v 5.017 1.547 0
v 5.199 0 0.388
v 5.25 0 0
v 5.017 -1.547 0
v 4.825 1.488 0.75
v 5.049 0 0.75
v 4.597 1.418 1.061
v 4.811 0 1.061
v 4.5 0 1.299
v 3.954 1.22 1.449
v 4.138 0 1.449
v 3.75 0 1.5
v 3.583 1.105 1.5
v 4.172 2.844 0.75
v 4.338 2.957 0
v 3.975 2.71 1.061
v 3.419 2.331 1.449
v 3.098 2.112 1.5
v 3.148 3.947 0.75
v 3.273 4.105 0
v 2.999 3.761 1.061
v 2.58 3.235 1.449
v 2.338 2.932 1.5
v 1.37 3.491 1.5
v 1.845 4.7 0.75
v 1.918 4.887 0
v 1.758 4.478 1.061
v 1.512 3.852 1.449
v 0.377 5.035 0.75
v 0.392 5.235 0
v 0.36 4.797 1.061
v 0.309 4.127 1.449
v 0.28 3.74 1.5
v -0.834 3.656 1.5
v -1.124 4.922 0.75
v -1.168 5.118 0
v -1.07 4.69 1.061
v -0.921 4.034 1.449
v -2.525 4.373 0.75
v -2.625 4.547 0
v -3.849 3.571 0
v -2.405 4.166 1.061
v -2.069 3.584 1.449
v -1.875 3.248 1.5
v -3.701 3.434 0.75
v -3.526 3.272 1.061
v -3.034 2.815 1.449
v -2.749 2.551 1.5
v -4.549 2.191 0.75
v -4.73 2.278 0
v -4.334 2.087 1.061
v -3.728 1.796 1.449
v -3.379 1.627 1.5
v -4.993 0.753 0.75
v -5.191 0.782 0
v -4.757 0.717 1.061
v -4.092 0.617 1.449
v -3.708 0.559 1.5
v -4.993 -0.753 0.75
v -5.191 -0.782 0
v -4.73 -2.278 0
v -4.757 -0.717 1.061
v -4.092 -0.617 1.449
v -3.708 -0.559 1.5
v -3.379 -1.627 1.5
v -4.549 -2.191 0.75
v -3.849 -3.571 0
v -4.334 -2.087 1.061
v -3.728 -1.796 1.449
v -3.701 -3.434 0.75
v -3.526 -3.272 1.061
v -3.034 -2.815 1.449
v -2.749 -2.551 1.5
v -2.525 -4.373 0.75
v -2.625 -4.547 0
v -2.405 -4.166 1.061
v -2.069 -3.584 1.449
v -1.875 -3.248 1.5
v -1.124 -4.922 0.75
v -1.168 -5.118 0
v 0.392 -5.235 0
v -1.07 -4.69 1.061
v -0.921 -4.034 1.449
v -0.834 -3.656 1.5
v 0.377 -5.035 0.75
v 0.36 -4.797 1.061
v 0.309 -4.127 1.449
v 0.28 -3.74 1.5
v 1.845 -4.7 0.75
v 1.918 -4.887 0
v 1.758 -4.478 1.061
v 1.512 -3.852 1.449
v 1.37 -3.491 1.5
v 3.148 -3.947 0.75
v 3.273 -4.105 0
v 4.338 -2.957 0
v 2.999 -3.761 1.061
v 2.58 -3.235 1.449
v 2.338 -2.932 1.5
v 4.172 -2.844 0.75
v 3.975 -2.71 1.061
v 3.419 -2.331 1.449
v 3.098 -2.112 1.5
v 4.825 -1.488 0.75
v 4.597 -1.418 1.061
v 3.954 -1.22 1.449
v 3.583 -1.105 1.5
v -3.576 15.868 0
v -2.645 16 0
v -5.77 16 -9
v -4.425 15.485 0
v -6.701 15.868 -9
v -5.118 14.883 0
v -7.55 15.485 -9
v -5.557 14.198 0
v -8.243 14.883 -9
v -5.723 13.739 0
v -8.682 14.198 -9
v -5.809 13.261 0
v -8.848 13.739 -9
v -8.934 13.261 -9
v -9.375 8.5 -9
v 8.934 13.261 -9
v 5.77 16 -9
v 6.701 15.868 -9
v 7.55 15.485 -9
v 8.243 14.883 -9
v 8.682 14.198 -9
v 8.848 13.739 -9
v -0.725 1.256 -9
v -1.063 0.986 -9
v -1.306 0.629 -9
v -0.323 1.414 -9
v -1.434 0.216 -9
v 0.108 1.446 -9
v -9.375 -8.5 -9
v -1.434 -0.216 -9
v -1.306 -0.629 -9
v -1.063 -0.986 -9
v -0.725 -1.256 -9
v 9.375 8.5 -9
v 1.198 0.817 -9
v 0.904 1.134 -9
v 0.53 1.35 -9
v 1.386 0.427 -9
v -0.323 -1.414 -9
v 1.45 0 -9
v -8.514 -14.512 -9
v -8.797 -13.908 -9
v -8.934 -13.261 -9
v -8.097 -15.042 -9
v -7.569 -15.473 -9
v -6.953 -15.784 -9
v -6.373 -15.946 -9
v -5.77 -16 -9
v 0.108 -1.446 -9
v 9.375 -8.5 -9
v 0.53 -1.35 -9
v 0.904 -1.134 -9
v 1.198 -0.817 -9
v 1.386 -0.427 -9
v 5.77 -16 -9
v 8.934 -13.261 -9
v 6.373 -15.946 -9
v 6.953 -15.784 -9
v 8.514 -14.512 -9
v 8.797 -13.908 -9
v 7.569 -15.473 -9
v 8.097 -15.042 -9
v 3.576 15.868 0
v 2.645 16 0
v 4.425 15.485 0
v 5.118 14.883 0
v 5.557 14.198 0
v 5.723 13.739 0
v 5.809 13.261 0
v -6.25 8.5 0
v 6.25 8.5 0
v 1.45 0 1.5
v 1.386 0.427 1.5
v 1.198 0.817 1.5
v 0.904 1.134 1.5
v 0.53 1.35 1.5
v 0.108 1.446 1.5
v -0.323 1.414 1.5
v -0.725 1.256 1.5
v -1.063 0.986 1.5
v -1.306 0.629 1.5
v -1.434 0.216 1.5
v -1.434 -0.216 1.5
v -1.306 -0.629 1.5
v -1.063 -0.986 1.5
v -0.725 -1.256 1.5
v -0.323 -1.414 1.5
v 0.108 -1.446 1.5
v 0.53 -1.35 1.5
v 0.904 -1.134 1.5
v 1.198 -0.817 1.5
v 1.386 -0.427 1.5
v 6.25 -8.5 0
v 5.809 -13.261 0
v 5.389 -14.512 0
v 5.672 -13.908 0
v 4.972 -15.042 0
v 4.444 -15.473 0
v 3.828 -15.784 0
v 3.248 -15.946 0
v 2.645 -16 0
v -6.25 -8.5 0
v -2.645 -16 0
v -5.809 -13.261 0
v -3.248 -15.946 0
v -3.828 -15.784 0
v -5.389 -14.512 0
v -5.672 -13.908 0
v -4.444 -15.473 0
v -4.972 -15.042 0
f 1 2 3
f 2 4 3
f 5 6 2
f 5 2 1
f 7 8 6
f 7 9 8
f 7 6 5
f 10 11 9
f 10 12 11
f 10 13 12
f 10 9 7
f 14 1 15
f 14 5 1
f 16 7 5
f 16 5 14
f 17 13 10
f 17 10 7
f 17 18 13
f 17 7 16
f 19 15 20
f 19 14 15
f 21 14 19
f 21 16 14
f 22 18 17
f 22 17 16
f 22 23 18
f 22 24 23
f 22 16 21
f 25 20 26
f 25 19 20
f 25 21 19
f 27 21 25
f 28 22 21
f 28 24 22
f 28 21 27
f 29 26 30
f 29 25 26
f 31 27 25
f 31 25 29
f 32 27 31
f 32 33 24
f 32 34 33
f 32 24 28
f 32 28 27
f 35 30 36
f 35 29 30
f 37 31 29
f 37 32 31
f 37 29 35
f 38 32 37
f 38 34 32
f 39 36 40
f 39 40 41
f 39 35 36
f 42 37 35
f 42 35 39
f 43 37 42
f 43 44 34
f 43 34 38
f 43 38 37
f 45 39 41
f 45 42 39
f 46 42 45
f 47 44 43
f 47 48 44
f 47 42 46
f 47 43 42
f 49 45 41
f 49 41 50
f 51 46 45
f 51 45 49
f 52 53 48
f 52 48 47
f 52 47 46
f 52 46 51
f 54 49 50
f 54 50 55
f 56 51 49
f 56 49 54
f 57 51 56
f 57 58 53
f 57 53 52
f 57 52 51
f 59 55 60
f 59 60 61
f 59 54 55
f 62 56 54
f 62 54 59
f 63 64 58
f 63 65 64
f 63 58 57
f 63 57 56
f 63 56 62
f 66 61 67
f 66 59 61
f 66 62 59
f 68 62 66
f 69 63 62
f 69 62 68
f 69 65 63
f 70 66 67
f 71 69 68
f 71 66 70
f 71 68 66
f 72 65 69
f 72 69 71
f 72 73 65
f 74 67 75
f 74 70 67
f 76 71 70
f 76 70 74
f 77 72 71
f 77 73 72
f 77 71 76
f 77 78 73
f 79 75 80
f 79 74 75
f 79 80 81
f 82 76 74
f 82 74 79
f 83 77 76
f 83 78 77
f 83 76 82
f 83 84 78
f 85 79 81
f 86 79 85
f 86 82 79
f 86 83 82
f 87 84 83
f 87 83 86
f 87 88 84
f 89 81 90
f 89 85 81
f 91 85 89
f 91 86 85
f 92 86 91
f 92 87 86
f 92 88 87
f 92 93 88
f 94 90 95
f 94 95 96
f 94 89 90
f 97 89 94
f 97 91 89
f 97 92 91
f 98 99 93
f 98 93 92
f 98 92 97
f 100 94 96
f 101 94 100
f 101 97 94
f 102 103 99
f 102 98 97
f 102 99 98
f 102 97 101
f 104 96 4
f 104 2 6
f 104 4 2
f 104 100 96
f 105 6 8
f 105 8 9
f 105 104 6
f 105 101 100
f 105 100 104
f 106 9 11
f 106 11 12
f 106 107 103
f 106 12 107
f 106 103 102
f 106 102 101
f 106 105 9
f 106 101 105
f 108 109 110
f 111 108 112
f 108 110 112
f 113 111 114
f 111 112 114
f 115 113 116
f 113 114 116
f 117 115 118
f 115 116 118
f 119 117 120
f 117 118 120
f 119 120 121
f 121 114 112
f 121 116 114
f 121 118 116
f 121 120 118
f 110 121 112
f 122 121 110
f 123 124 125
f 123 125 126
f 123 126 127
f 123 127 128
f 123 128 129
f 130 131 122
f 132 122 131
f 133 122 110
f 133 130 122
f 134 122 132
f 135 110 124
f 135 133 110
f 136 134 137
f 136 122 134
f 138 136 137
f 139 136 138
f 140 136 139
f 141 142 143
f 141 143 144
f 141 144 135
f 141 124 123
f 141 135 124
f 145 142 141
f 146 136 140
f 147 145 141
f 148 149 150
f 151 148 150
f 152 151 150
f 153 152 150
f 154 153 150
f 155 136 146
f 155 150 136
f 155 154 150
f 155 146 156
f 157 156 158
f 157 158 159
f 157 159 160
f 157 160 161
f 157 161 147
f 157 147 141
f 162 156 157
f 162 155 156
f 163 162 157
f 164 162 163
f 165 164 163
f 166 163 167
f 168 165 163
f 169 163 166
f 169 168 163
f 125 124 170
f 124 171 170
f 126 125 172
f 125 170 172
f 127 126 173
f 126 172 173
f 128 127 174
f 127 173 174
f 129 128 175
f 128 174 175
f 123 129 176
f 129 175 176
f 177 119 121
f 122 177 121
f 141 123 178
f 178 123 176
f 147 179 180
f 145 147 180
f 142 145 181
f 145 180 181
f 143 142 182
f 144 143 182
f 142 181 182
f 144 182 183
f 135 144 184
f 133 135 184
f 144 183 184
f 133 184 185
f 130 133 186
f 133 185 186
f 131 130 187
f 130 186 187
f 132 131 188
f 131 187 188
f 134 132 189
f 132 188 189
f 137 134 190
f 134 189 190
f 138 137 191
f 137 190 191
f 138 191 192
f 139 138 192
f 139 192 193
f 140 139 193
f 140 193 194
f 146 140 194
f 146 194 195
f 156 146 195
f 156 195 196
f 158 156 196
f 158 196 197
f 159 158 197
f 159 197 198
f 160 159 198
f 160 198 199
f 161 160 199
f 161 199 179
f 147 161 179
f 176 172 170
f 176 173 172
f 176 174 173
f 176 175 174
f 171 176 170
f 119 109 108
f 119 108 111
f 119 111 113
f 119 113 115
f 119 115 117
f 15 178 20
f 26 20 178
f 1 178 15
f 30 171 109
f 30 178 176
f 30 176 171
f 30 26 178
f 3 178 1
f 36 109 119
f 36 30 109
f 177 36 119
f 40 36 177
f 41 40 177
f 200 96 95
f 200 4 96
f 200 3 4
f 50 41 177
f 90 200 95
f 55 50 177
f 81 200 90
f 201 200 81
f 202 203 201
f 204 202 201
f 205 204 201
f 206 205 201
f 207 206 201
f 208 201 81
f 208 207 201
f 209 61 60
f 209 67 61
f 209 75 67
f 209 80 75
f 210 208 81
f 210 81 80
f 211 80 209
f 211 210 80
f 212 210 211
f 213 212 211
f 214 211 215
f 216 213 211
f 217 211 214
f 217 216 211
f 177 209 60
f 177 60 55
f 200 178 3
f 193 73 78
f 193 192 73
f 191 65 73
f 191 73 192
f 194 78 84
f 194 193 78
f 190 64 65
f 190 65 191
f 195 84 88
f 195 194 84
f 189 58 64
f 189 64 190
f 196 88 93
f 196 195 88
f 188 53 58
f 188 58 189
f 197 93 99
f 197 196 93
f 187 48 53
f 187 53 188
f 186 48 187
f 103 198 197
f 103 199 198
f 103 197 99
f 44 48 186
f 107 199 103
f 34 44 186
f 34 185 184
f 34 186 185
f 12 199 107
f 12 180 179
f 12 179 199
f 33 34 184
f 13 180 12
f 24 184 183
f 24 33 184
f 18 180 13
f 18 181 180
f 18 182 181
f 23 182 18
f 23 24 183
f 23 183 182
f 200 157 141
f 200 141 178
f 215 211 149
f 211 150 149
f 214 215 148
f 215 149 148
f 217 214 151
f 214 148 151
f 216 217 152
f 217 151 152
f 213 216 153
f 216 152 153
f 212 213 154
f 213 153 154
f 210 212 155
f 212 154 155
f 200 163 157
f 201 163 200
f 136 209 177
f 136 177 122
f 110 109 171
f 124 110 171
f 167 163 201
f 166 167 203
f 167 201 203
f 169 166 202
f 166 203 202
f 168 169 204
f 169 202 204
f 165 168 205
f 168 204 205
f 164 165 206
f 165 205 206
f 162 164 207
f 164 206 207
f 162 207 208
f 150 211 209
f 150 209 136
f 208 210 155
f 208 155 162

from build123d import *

# Parameters (mm, degrees)
F1_DEPTH   = 16
F2_R       = 5.25
F3_DEPTH   = 1.5
F4_R       = 1.45
F5_DEPTH   = 12
F6_SIZE2   = 0.6561649764
F6_SIZE    = 7.5
F6_2_SIZE2 = 0.6561649764
F6_2_SIZE  = 7.5
F7_R       = 3
F8_R       = 1.49999


# Not quite as in the source:
# - a fillet or chamfer is up to 0.001 mm smaller than in the source, because OpenCascade refuses the exact size


with BuildPart() as f1:
    # F0 (on Front) → F1 (new body, symmetric)
    with BuildSketch(Plane.XZ):
        Polygon((6.25, 0), (0, 0), (-6.25, 0), (-9.375, -9), (0, -9), (9.375, -9), align=None)
    extrude(amount=F1_DEPTH, both=True)

    # F2 (on face) → F3 (join)
    with BuildSketch(Plane.XY):
        Circle(F2_R)
    extrude(amount=F3_DEPTH)

    # F4 (on face) → F5 (cut)
    with BuildSketch(Plane.XY.offset(1.5)):
        Circle(F4_R)
    extrude(amount=-F5_DEPTH, mode=Mode.SUBTRACT)

    # F6
    f6_edges = [f1.edges().sort_by_distance(p)[0] for p in [
        (7.8125, -16, -4.5),
        (7.8125, 16, -4.5),
    ]]
    f6_side = f1.faces().sort_by_distance((7.8125, 0, -4.5))[0]
    chamfer(f6_edges, length=F6_SIZE, length2=F6_SIZE2, reference=f6_side)

    # F6#2
    f6_2_edges = [f1.edges().sort_by_distance(p)[0] for p in [
        (-7.8125, -16, -4.5),
        (-7.8125, 16, -4.5),
    ]]
    f6_2_side = f1.faces().sort_by_distance((-7.8125, 0, -4.5))[0]
    chamfer(f6_2_edges, length=F6_2_SIZE, length2=F6_2_SIZE2, reference=f6_2_side)

    # F7
    f7_edges = [f1.edges().sort_by_distance(p)[0] for p in [
        (7.117906, -16, -4.5),
        (-7.117906, -16, -4.5),
        (7.117906, 16, -4.5),
        (-7.117906, 16, -4.5),
    ]]
    fillet(f7_edges, radius=F7_R)

    # F8 (radius 1.5 in the source; OpenCascade refuses exactly that, so slightly less here)
    f8_edges = [f1.edges().sort_by_distance(p)[0] for p in [
        (-5.25, 0, 1.5),
    ]]
    fillet(f8_edges, radius=F8_R)


solid = f1.part
